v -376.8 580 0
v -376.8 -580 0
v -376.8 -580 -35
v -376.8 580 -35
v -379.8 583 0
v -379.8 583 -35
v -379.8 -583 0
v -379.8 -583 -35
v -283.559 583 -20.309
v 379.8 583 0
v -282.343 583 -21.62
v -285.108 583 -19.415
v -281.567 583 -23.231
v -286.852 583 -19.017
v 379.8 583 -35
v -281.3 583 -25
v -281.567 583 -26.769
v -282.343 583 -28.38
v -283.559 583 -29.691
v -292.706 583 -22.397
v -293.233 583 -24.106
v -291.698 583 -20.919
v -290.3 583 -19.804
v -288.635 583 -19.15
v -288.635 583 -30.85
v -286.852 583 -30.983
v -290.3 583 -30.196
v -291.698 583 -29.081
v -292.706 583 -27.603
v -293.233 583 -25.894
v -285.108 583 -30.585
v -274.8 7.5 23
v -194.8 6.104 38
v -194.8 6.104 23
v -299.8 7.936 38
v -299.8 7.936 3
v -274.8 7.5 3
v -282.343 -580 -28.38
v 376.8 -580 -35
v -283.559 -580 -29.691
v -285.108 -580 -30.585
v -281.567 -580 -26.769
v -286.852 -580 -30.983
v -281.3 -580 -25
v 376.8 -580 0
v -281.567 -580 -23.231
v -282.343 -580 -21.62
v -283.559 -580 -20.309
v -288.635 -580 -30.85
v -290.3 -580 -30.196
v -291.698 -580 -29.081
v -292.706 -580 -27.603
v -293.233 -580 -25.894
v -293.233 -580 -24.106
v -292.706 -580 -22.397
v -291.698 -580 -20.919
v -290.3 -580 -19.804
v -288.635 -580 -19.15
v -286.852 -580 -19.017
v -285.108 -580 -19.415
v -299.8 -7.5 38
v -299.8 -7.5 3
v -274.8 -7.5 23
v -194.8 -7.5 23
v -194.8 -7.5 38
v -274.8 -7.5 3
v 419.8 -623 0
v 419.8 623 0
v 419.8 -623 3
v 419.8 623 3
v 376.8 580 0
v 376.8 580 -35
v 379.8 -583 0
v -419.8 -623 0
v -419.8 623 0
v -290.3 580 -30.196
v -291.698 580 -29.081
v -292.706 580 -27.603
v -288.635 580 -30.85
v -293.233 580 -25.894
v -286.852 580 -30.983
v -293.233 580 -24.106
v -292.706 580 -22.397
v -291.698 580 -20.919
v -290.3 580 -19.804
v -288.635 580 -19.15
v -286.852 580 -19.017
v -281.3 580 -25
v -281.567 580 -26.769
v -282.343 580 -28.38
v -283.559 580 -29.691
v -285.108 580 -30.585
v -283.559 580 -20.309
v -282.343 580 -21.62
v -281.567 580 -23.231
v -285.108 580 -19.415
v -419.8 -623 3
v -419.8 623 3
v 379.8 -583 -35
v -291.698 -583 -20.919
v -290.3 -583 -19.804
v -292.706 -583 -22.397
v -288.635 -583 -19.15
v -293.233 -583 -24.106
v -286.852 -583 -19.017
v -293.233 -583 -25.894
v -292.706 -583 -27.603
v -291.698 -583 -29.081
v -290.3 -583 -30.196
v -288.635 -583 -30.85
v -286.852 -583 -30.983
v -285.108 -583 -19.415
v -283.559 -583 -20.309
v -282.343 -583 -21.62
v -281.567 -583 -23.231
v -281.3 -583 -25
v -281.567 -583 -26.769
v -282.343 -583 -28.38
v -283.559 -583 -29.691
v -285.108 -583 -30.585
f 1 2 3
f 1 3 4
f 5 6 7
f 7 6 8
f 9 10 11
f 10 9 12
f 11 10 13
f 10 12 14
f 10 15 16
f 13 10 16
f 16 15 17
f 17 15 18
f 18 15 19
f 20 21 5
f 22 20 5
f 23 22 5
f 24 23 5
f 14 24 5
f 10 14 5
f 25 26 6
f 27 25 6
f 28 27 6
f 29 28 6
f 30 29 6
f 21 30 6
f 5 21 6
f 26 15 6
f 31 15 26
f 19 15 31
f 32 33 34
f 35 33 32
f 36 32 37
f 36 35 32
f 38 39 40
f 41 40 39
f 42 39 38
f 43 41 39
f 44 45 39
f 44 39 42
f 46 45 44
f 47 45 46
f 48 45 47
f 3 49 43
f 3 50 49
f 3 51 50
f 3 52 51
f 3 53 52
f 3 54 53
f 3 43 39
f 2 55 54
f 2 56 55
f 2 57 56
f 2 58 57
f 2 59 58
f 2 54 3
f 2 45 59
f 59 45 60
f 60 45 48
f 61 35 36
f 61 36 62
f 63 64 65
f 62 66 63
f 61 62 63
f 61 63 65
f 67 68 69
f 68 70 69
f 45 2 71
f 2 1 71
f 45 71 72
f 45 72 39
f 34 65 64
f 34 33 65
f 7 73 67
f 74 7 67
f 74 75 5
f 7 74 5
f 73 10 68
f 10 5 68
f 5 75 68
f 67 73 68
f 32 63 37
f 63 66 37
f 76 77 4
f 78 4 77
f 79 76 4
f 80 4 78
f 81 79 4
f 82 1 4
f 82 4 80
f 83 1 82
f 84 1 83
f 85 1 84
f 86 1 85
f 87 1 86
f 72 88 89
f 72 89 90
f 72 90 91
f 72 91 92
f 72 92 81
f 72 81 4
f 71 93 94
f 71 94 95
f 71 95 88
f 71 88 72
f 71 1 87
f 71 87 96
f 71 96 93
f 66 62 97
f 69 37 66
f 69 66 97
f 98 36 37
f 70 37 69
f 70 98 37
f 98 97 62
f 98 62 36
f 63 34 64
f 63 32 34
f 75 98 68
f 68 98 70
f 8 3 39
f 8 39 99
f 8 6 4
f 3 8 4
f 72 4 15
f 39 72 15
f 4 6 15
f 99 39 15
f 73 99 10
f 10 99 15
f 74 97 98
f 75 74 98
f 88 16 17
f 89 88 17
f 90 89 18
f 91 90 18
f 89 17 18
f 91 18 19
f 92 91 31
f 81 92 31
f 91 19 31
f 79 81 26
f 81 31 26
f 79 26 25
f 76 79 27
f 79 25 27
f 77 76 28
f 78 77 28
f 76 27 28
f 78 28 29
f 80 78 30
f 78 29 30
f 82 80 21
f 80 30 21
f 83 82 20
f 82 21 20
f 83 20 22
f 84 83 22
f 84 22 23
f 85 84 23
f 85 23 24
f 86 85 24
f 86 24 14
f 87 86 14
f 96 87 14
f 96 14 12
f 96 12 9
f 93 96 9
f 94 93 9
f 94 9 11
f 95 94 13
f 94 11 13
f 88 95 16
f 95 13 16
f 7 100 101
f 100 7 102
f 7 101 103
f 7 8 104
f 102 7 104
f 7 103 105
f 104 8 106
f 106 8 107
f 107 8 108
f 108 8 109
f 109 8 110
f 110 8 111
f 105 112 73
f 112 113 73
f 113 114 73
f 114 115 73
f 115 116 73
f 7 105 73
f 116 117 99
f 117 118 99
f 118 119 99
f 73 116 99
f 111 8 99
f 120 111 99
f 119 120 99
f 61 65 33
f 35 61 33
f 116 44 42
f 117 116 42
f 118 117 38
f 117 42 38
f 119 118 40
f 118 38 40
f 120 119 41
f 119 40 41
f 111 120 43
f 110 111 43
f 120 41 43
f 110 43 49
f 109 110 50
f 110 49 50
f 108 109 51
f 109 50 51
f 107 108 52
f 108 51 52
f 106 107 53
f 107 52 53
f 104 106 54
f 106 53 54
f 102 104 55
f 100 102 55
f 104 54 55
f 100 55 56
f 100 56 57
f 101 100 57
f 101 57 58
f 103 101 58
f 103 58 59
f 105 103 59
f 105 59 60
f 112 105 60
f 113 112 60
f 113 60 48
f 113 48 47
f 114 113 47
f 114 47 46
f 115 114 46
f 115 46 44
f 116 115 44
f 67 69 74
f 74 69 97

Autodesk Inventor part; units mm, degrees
ref_plane "YZ Plane" through (0, 0, 0) normal (1, 0, 0) x (0, 1, 0)
ref_plane "XZ Plane" through (0, 0, 0) normal (0, 1, 0) x (-1, 0, 0)
ref_plane "XY Plane" through (0, 0, 0) normal (0, 0, 1) x (1, 0, 0)
sketch "Sketch1" plane through (0, 0, 0) normal (0, 0, 1) x (1, 0, 0)
  line L0 (-379.8, -583) -> (379.8, -583)
  line L1 (379.8, -583) -> (379.8, 583)
  line L2 (379.8, 583) -> (-379.8, 583)
  line L3 (-379.8, 583) -> (-379.8, -583)
  line L4 (-379.8, -583) -> (379.8, 583) construction
  line L5 (379.8, -583) -> (-379.8, 583) construction
  point P0 (0, 0)
  dimension "d0" = 759.6
  dimension "d1" = 1166
extrude "Extrusion1" add sketch "Sketch1" along normal blind 3
sketch "Sketch2" plane through (0, 0, 3) normal (0, 0, 1) x (1, 0, 0)
  line L0 (379.8, 583) -> (-379.8, 583) projected
  line L1 (379.8, -583) -> (379.8, 583) projected
  line L2 (-379.8, -583) -> (379.8, -583) projected
  line L3 (-379.8, 583) -> (-379.8, -583) projected
  line L4 (-376.8, 580) -> (376.8, 580)
  line L5 (376.8, 580) -> (376.8, -580)
  line L6 (376.8, -580) -> (-376.8, -580)
  line L7 (-376.8, -580) -> (-376.8, 580)
  point P0 (0, 0)
  dimension "d4" = 3
extrude "Extrusion2" add sketch "Sketch2" against normal blind 38
sketch "Sketch3" plane through (0, 0, 3) normal (0, 0, 1) x (1, 0, 0)
  line L0 (-299.8, -7.5) -> (-274.8, -7.5)
  line L1 (-274.8, -7.5) -> (-274.8, 7.5)
  line L2 (-274.8, 7.5) -> (-299.8, 7.5)
  line L3 (-299.8, 7.5) -> (-299.8, -7.5)
  line L4 (-299.8, -7.5) -> (-274.8, 7.5) construction
  line L5 (-274.8, -7.5) -> (-299.8, 7.5) construction
  line L6 (-379.8, 583) -> (-379.8, -583) projected
  point P0 (0, 0)
  point P1 (-287.3, 0)
  dimension "d7" = 25
  dimension "d8" = 15
  dimension "d9" = 80
extrude "Extrusion3" add sketch "Sketch3" along normal blind 35
sketch "Sketch4" plane through (-274.8, -7.5, 3) normal (1, 0, 0) x (0, 0, -1)
  line L0 (-35, 0) -> (-35, 15) projected
  line L1 (-35, 15) -> (-20, 15)
  line L2 (-20, 15) -> (-20, 0)
  line L3 (-20, 0) -> (-35, 0)
  line L4 (-35, 0) -> (-35, 15)
  point P0 (3, 7.5)
  dimension "d12" = 15
  dimension "d13" = 15
extrude "Extrusion4" add sketch "Sketch4" along normal blind 80
draft "FaceDraft2" angle 1 pull direction (1, 0, 0) faces at (-256.4667, 7.5, 33) fixed edges at (-274.8, 7.5, 13)
sketch "Sketch5" plane through (-379.8, 583, 3) normal (0, 1, 0) x (1, 0, 0)
  line L0 (80, 0) -> (80, -35) construction
  line L1 (105, 0) -> (105, -20) construction
  line L2 (80, 0) -> (105, 0) construction
  line L3 (759.6, 0) -> (0, 0) projected
  line L4 (92.5, 0) -> (92.5, 56) construction
  circle A0 centre (92.5, 28) radius 6
  line L5 (0, 38) -> (759.6, 38) projected
  point P0 (379.8, 3)
  dimension "d18" = 12.5
  dimension "d19" = 12
  dimension "d20" = 10
extrude "Extrusion5" cut sketch "Sketch5" against normal through all
sketch "Sketch7" plane through (0, 0, 3) normal (0, 0, 1) x (1, 0, 0)
  line L0 (379.8, 583) -> (-379.8, 583) projected
  line L1 (-379.8, 583) -> (-379.8, -583) projected
  line L2 (379.8, -583) -> (379.8, 583) projected
  line L3 (-379.8, -583) -> (379.8, -583) projected
  line L4 (-419.8, 623) -> (419.8, 623)
  line L5 (419.8, 623) -> (419.8, -623)
  line L6 (419.8, -623) -> (-419.8, -623)
  line L7 (-419.8, -623) -> (-419.8, 623)
  point P0 (0, 0)
  dimension "d26" = 40
extrude "Extrusion7" add sketch "Sketch7" against normal blind 3
properties part number "EnclosureDoor" material "Steel, Galvanized"
